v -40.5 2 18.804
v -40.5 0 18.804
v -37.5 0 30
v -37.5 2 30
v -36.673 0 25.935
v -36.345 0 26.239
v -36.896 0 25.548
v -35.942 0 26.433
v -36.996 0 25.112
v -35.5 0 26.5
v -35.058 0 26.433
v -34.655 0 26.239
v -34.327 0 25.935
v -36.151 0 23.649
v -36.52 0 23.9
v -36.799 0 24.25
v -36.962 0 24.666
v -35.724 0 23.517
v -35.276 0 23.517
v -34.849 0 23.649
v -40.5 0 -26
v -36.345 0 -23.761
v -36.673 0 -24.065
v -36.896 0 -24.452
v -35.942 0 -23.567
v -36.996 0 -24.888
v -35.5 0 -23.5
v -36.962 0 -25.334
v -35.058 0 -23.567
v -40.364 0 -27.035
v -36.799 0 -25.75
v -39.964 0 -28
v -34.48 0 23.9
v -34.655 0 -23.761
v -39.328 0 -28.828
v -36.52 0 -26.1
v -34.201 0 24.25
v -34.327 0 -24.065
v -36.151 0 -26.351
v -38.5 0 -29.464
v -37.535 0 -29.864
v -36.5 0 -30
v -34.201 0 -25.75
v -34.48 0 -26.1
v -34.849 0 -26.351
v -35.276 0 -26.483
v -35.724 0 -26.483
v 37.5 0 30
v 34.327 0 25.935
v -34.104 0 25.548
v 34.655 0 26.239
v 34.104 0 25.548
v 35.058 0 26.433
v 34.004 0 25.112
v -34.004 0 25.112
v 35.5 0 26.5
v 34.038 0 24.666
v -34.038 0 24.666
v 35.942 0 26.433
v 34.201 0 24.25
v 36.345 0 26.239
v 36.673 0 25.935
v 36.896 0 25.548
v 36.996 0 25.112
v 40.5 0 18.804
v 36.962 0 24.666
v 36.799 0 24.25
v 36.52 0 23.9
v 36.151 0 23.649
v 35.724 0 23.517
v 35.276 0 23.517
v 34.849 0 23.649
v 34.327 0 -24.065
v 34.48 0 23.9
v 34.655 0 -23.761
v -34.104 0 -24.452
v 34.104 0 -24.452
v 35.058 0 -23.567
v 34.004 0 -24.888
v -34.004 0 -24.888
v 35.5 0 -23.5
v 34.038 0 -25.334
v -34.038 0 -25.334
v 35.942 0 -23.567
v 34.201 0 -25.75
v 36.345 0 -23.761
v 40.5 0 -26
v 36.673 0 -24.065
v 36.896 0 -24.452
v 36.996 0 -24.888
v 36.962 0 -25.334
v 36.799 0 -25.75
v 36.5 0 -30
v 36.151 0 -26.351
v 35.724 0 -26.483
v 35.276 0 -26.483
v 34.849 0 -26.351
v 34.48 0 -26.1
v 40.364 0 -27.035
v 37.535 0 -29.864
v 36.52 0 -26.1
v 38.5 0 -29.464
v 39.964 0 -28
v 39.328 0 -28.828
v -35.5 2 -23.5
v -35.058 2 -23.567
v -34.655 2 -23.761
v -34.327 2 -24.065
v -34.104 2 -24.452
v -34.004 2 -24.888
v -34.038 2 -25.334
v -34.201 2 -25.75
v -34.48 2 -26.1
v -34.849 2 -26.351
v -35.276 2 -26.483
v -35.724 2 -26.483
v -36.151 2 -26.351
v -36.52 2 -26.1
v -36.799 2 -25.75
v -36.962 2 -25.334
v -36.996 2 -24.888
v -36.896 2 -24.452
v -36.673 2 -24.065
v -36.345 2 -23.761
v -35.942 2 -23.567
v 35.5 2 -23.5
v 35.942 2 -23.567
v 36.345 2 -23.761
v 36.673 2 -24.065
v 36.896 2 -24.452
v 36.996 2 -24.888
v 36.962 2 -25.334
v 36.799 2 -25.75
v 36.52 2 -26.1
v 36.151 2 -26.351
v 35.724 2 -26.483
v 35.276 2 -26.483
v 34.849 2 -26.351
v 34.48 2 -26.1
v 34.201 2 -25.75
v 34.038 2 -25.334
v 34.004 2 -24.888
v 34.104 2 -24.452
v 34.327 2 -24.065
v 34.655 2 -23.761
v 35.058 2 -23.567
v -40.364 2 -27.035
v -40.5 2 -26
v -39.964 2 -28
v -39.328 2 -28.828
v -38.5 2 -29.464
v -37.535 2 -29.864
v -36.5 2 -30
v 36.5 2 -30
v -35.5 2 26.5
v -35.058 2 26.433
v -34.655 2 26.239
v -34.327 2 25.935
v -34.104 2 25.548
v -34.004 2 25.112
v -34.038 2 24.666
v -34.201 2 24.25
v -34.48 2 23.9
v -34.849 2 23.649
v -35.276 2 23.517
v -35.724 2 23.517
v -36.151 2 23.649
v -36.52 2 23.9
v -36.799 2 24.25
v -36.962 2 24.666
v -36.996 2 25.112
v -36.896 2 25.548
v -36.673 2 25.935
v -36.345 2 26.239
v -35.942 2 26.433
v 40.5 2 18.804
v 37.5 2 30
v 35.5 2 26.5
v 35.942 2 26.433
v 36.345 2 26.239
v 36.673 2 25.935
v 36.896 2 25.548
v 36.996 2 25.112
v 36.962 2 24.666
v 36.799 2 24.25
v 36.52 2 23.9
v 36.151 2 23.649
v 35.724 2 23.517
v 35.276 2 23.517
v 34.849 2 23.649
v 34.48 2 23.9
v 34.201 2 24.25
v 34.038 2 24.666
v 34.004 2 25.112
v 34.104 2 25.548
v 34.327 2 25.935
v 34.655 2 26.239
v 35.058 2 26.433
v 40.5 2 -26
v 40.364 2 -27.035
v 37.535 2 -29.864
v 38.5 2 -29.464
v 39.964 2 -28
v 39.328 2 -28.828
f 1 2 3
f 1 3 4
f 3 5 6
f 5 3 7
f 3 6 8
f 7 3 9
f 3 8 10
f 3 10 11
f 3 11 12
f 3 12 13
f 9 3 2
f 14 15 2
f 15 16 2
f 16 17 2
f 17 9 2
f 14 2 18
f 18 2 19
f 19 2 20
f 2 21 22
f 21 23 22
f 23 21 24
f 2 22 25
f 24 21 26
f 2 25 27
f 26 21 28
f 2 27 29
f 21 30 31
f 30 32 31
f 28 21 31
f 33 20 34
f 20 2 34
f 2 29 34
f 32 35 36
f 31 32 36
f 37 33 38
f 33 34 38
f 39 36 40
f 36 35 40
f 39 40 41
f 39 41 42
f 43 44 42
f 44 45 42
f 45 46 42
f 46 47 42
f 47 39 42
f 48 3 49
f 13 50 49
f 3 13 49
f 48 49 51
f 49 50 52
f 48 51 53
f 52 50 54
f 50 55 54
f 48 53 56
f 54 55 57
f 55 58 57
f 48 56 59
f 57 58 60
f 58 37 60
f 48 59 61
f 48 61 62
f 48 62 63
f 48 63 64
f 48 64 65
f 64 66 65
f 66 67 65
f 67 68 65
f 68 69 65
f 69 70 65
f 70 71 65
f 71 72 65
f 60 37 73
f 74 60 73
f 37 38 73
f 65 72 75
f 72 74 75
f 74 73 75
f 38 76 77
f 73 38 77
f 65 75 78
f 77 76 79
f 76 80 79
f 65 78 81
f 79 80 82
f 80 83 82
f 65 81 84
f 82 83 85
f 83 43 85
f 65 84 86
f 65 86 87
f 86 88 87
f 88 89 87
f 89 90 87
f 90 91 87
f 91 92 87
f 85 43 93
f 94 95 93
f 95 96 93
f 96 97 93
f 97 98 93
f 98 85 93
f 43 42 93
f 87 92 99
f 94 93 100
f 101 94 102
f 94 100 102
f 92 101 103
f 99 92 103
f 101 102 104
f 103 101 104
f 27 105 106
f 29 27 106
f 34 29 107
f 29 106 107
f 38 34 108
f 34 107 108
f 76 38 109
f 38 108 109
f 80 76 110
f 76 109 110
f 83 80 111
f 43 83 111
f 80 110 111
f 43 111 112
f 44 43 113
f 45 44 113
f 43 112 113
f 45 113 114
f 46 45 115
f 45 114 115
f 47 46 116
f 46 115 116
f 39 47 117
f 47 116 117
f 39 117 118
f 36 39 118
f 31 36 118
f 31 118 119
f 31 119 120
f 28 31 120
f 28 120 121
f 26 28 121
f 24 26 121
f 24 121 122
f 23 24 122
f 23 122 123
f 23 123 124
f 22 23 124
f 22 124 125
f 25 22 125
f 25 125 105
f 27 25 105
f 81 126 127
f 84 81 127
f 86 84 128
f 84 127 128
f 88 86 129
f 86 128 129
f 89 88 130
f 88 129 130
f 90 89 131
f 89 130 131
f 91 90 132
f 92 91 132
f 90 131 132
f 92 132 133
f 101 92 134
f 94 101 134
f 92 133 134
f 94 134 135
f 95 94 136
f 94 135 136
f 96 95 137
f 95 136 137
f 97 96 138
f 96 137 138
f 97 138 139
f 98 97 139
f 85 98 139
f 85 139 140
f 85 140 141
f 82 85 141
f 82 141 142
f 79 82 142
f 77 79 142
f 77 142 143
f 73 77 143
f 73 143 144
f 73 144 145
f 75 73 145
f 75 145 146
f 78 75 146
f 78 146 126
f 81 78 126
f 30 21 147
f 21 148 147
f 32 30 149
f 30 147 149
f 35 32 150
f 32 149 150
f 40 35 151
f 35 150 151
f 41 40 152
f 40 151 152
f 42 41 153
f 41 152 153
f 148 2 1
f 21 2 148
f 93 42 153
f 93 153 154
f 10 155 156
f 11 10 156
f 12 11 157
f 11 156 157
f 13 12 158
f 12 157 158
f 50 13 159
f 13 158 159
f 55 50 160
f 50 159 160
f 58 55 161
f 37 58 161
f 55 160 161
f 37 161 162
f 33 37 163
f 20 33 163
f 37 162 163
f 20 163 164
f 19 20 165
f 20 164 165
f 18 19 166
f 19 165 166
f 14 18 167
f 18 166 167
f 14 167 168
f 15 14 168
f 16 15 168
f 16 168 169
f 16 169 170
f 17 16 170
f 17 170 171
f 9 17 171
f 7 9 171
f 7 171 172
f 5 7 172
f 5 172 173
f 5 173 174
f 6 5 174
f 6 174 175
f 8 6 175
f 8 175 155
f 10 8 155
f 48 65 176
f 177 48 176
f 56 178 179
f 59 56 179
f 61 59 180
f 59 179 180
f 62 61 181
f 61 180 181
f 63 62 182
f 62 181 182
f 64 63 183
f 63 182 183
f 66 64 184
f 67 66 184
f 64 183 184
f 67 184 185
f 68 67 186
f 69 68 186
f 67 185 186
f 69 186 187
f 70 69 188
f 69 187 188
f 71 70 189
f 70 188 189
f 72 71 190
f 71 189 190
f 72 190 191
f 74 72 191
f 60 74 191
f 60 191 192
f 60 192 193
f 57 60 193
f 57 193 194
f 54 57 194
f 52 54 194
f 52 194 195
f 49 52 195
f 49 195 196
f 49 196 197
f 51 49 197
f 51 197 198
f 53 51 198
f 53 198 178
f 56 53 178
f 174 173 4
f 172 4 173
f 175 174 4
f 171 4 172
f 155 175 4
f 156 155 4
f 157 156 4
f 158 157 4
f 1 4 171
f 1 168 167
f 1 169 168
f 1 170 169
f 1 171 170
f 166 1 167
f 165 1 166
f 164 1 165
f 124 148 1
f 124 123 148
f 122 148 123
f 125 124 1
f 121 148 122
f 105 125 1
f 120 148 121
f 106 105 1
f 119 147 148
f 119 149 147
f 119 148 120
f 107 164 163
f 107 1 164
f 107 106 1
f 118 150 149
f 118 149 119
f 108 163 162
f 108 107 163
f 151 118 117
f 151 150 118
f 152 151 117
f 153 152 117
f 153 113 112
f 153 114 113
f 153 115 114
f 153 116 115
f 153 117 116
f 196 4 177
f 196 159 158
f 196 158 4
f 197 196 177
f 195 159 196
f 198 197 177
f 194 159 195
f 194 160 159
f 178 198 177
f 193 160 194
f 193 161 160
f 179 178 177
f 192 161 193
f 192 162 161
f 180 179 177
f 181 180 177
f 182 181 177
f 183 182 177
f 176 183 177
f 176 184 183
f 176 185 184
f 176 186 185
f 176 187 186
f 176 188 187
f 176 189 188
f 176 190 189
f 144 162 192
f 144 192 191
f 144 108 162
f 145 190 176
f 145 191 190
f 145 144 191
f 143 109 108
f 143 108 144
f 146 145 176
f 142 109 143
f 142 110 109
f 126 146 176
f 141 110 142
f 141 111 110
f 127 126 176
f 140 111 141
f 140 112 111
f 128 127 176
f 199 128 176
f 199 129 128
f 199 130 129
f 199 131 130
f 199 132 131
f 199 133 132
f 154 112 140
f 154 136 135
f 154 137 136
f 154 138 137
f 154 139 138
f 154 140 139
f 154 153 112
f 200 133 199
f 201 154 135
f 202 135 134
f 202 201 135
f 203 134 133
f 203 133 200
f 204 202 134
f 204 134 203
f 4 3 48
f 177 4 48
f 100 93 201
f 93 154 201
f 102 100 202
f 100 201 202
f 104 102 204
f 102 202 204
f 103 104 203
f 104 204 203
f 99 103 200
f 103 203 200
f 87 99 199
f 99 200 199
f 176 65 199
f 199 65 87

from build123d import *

# Parameters (mm, degrees)
SKETCH1_W           = 81
SKETCH1_H           = 60
BOSS_EXTRUDE1_DEPTH = 2
SKETCH2_R           = 1.5
CUT_EXTRUDE1_DEPTH  = 51.440559077
FILLET1_R           = 4
CHAMFER1_SIZE       = 3
CHAMFER1_SIZE2      = 11.196152423
CHAMFER2_SIZE       = 3
CHAMFER2_SIZE2      = 11.196152423


with BuildPart() as part:
    # Sketch1 → Boss-Extrude1 (new body)
    with BuildSketch(Plane(origin=(0, 0, 0), x_dir=(1, 0, 0), z_dir=(0, 1, 0))):
        Rectangle(SKETCH1_W, SKETCH1_H)
    extrude(amount=BOSS_EXTRUDE1_DEPTH)

    # Sketch2 → Cut-Extrude1 (cut, through all)
    with BuildSketch(Plane(origin=(0, 2, 0), x_dir=(1, 0, 0), z_dir=(0, 1, 0))):
        with Locations(Location((-35.5, -25, 0), (0, 0, 270))):
            Circle(SKETCH2_R)
        with Locations(Location((35.5, -25, 0), (0, 0, 270))):
            Circle(SKETCH2_R)
        with Locations(Location((-35.5, 25, 0), (0, 0, 270))):
            Circle(SKETCH2_R)
        with Locations(Location((35.5, 25, 0), (0, 0, 270))):
            Circle(SKETCH2_R)
    extrude(amount=-CUT_EXTRUDE1_DEPTH, mode=Mode.SUBTRACT)

    # Fillet1
    fillet1_edges = [part.edges().sort_by_distance(p)[0] for p in [
        (-40.5, 1, -30),
        (40.5, 1, -30),
    ]]
    fillet(fillet1_edges, radius=FILLET1_R)

    # Chamfer1
    chamfer1_edges = [part.edges().sort_by_distance(p)[0] for p in [
        (40.5, 1, 30),
    ]]
    chamfer1_side = [part.faces().sort_by_distance(p)[0] for p in [
        (0, 1, 30),
    ]]
    chamfer(chamfer1_edges, length=CHAMFER1_SIZE, length2=CHAMFER1_SIZE2, reference=chamfer1_side[0])

    # Chamfer2
    chamfer2_edges = [part.edges().sort_by_distance(p)[0] for p in [
        (-40.5, 1, 30),
    ]]
    chamfer2_side = [part.faces().sort_by_distance(p)[0] for p in [
        (-1.5, 1, 30),
    ]]
    chamfer(chamfer2_edges, length=CHAMFER2_SIZE, length2=CHAMFER2_SIZE2, reference=chamfer2_side[0])


solid = part.part
